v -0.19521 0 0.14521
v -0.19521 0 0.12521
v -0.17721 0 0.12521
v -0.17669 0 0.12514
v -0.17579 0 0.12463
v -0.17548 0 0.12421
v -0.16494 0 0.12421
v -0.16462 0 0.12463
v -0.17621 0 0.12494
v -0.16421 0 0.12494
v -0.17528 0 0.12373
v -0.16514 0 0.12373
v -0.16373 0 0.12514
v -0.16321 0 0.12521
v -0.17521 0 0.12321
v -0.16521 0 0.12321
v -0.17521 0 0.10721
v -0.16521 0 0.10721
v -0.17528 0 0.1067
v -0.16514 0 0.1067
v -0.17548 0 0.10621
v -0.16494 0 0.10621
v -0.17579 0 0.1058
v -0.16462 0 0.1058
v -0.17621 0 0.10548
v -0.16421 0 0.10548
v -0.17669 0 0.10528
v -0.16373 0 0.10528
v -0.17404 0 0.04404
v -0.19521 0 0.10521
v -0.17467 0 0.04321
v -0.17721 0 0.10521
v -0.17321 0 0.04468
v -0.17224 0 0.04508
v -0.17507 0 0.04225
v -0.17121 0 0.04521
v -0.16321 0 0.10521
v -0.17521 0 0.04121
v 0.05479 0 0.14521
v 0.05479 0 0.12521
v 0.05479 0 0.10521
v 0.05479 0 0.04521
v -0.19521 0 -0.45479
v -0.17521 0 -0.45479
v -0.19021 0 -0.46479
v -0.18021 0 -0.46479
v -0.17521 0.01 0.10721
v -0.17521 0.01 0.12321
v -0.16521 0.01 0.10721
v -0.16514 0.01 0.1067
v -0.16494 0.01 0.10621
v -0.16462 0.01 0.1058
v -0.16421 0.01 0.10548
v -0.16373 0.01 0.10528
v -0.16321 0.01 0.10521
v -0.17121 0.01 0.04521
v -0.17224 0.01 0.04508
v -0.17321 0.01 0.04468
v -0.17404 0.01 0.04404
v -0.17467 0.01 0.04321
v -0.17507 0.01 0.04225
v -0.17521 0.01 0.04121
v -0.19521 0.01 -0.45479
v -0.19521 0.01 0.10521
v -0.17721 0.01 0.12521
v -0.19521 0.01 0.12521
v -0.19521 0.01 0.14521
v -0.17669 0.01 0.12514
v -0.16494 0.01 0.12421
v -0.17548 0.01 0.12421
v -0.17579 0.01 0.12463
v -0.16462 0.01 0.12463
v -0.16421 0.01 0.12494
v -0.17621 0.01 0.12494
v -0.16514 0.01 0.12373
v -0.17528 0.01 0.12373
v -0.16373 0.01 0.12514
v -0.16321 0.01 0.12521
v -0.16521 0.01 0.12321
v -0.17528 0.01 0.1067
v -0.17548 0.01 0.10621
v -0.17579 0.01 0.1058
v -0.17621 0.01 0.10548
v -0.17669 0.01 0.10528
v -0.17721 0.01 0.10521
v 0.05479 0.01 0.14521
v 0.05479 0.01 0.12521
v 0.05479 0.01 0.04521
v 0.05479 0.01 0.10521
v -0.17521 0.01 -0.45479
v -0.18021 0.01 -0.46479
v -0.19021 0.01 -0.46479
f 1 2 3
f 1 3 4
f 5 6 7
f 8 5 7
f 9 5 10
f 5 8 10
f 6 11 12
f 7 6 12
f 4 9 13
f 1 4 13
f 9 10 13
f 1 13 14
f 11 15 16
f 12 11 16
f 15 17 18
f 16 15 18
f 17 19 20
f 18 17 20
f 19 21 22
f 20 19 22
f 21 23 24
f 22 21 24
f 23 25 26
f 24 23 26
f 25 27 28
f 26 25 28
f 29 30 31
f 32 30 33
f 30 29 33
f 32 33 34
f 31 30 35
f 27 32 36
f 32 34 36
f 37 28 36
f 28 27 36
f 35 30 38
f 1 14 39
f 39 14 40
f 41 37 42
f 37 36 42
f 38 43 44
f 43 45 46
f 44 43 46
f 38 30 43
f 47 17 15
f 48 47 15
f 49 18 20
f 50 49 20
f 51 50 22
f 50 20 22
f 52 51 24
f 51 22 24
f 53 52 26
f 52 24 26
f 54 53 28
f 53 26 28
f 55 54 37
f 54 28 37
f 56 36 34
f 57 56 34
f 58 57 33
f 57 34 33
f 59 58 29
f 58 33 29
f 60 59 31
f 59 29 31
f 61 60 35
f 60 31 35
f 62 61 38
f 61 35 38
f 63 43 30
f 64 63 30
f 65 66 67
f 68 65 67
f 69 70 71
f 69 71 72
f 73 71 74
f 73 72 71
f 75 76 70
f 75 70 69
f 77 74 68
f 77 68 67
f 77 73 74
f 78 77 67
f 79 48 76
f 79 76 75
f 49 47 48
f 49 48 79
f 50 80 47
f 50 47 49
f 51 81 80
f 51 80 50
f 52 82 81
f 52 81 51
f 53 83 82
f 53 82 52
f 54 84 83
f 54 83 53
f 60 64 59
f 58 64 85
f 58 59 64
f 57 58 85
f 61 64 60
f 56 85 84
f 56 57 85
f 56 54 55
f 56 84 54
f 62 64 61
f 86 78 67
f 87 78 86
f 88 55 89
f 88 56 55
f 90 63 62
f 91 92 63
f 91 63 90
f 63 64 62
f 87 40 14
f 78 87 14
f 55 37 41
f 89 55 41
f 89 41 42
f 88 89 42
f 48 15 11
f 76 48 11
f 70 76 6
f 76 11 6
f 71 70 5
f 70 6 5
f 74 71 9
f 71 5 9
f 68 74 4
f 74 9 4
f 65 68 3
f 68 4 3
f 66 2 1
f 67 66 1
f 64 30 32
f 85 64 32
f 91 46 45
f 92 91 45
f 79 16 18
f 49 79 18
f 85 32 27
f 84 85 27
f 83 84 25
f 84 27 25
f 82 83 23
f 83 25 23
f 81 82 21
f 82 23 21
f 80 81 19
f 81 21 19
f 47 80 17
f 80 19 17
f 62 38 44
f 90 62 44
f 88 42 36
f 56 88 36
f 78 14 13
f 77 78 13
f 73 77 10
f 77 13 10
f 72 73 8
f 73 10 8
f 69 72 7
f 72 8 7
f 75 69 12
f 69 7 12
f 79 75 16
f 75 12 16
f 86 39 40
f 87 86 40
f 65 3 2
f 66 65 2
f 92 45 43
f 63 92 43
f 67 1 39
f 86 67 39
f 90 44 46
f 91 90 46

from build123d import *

# Parameters (mm, degrees)
BOSS_EXTRUDE1_DEPTH = 0.01


with BuildPart() as part:
    # Sketch1 → Boss-Extrude1 (new body)
    with BuildSketch(Plane(origin=(0, 0, 0), x_dir=(1, 0, 0), z_dir=(0, 1, 0))):
        with BuildLine():
            Line((-0.175207919, 0.454787097), (-0.180207919, 0.464787097))
            Line((-0.180207919, 0.464787097), (-0.190207919, 0.464787097))
            Line((-0.190207919, 0.464787097), (-0.195207919, 0.454787097))
            Line((-0.195207919, 0.454787097), (-0.195207919, -0.065212903))
            Line((-0.195207919, -0.065212903), (-0.195207919, -0.105212903))
            Line((-0.195207919, -0.105212903), (-0.177207919, -0.105212903))
            ThreePointArc((-0.177207919, -0.105212903), (-0.175793705, -0.10579869), (-0.175207919, -0.107212903))
            Line((-0.175207919, -0.107212903), (-0.175207919, -0.123212903))
            ThreePointArc((-0.175207919, -0.123212903), (-0.175793705, -0.124627117), (-0.177207919, -0.125212903))
            Line((-0.177207919, -0.125212903), (-0.195207919, -0.125212903))
            Line((-0.195207919, -0.125212903), (-0.195207919, -0.145212903))
            Line((-0.195207919, -0.145212903), (0.054792081, -0.145212903))
            Line((0.054792081, -0.145212903), (0.054792081, -0.125212903))
            Line((0.054792081, -0.125212903), (-0.163207919, -0.125212903))
            ThreePointArc((-0.163207919, -0.125212903), (-0.164622133, -0.124627117), (-0.165207919, -0.123212903))
            Line((-0.165207919, -0.123212903), (-0.165207919, -0.107212903))
            ThreePointArc((-0.165207919, -0.107212903), (-0.164622133, -0.10579869), (-0.163207919, -0.105212903))
            Line((-0.163207919, -0.105212903), (0.054792081, -0.105212903))
            Line((0.054792081, -0.105212903), (0.054792081, -0.045212903))
            Line((0.054792081, -0.045212903), (-0.171207919, -0.045212903))
            ThreePointArc((-0.171207919, -0.045212903), (-0.174036346, -0.04404133), (-0.175207919, -0.041212903))
            Line((-0.175207919, -0.041212903), (-0.175207919, 0.454787097))
        make_face()
    extrude(amount=BOSS_EXTRUDE1_DEPTH)


solid = part.part
